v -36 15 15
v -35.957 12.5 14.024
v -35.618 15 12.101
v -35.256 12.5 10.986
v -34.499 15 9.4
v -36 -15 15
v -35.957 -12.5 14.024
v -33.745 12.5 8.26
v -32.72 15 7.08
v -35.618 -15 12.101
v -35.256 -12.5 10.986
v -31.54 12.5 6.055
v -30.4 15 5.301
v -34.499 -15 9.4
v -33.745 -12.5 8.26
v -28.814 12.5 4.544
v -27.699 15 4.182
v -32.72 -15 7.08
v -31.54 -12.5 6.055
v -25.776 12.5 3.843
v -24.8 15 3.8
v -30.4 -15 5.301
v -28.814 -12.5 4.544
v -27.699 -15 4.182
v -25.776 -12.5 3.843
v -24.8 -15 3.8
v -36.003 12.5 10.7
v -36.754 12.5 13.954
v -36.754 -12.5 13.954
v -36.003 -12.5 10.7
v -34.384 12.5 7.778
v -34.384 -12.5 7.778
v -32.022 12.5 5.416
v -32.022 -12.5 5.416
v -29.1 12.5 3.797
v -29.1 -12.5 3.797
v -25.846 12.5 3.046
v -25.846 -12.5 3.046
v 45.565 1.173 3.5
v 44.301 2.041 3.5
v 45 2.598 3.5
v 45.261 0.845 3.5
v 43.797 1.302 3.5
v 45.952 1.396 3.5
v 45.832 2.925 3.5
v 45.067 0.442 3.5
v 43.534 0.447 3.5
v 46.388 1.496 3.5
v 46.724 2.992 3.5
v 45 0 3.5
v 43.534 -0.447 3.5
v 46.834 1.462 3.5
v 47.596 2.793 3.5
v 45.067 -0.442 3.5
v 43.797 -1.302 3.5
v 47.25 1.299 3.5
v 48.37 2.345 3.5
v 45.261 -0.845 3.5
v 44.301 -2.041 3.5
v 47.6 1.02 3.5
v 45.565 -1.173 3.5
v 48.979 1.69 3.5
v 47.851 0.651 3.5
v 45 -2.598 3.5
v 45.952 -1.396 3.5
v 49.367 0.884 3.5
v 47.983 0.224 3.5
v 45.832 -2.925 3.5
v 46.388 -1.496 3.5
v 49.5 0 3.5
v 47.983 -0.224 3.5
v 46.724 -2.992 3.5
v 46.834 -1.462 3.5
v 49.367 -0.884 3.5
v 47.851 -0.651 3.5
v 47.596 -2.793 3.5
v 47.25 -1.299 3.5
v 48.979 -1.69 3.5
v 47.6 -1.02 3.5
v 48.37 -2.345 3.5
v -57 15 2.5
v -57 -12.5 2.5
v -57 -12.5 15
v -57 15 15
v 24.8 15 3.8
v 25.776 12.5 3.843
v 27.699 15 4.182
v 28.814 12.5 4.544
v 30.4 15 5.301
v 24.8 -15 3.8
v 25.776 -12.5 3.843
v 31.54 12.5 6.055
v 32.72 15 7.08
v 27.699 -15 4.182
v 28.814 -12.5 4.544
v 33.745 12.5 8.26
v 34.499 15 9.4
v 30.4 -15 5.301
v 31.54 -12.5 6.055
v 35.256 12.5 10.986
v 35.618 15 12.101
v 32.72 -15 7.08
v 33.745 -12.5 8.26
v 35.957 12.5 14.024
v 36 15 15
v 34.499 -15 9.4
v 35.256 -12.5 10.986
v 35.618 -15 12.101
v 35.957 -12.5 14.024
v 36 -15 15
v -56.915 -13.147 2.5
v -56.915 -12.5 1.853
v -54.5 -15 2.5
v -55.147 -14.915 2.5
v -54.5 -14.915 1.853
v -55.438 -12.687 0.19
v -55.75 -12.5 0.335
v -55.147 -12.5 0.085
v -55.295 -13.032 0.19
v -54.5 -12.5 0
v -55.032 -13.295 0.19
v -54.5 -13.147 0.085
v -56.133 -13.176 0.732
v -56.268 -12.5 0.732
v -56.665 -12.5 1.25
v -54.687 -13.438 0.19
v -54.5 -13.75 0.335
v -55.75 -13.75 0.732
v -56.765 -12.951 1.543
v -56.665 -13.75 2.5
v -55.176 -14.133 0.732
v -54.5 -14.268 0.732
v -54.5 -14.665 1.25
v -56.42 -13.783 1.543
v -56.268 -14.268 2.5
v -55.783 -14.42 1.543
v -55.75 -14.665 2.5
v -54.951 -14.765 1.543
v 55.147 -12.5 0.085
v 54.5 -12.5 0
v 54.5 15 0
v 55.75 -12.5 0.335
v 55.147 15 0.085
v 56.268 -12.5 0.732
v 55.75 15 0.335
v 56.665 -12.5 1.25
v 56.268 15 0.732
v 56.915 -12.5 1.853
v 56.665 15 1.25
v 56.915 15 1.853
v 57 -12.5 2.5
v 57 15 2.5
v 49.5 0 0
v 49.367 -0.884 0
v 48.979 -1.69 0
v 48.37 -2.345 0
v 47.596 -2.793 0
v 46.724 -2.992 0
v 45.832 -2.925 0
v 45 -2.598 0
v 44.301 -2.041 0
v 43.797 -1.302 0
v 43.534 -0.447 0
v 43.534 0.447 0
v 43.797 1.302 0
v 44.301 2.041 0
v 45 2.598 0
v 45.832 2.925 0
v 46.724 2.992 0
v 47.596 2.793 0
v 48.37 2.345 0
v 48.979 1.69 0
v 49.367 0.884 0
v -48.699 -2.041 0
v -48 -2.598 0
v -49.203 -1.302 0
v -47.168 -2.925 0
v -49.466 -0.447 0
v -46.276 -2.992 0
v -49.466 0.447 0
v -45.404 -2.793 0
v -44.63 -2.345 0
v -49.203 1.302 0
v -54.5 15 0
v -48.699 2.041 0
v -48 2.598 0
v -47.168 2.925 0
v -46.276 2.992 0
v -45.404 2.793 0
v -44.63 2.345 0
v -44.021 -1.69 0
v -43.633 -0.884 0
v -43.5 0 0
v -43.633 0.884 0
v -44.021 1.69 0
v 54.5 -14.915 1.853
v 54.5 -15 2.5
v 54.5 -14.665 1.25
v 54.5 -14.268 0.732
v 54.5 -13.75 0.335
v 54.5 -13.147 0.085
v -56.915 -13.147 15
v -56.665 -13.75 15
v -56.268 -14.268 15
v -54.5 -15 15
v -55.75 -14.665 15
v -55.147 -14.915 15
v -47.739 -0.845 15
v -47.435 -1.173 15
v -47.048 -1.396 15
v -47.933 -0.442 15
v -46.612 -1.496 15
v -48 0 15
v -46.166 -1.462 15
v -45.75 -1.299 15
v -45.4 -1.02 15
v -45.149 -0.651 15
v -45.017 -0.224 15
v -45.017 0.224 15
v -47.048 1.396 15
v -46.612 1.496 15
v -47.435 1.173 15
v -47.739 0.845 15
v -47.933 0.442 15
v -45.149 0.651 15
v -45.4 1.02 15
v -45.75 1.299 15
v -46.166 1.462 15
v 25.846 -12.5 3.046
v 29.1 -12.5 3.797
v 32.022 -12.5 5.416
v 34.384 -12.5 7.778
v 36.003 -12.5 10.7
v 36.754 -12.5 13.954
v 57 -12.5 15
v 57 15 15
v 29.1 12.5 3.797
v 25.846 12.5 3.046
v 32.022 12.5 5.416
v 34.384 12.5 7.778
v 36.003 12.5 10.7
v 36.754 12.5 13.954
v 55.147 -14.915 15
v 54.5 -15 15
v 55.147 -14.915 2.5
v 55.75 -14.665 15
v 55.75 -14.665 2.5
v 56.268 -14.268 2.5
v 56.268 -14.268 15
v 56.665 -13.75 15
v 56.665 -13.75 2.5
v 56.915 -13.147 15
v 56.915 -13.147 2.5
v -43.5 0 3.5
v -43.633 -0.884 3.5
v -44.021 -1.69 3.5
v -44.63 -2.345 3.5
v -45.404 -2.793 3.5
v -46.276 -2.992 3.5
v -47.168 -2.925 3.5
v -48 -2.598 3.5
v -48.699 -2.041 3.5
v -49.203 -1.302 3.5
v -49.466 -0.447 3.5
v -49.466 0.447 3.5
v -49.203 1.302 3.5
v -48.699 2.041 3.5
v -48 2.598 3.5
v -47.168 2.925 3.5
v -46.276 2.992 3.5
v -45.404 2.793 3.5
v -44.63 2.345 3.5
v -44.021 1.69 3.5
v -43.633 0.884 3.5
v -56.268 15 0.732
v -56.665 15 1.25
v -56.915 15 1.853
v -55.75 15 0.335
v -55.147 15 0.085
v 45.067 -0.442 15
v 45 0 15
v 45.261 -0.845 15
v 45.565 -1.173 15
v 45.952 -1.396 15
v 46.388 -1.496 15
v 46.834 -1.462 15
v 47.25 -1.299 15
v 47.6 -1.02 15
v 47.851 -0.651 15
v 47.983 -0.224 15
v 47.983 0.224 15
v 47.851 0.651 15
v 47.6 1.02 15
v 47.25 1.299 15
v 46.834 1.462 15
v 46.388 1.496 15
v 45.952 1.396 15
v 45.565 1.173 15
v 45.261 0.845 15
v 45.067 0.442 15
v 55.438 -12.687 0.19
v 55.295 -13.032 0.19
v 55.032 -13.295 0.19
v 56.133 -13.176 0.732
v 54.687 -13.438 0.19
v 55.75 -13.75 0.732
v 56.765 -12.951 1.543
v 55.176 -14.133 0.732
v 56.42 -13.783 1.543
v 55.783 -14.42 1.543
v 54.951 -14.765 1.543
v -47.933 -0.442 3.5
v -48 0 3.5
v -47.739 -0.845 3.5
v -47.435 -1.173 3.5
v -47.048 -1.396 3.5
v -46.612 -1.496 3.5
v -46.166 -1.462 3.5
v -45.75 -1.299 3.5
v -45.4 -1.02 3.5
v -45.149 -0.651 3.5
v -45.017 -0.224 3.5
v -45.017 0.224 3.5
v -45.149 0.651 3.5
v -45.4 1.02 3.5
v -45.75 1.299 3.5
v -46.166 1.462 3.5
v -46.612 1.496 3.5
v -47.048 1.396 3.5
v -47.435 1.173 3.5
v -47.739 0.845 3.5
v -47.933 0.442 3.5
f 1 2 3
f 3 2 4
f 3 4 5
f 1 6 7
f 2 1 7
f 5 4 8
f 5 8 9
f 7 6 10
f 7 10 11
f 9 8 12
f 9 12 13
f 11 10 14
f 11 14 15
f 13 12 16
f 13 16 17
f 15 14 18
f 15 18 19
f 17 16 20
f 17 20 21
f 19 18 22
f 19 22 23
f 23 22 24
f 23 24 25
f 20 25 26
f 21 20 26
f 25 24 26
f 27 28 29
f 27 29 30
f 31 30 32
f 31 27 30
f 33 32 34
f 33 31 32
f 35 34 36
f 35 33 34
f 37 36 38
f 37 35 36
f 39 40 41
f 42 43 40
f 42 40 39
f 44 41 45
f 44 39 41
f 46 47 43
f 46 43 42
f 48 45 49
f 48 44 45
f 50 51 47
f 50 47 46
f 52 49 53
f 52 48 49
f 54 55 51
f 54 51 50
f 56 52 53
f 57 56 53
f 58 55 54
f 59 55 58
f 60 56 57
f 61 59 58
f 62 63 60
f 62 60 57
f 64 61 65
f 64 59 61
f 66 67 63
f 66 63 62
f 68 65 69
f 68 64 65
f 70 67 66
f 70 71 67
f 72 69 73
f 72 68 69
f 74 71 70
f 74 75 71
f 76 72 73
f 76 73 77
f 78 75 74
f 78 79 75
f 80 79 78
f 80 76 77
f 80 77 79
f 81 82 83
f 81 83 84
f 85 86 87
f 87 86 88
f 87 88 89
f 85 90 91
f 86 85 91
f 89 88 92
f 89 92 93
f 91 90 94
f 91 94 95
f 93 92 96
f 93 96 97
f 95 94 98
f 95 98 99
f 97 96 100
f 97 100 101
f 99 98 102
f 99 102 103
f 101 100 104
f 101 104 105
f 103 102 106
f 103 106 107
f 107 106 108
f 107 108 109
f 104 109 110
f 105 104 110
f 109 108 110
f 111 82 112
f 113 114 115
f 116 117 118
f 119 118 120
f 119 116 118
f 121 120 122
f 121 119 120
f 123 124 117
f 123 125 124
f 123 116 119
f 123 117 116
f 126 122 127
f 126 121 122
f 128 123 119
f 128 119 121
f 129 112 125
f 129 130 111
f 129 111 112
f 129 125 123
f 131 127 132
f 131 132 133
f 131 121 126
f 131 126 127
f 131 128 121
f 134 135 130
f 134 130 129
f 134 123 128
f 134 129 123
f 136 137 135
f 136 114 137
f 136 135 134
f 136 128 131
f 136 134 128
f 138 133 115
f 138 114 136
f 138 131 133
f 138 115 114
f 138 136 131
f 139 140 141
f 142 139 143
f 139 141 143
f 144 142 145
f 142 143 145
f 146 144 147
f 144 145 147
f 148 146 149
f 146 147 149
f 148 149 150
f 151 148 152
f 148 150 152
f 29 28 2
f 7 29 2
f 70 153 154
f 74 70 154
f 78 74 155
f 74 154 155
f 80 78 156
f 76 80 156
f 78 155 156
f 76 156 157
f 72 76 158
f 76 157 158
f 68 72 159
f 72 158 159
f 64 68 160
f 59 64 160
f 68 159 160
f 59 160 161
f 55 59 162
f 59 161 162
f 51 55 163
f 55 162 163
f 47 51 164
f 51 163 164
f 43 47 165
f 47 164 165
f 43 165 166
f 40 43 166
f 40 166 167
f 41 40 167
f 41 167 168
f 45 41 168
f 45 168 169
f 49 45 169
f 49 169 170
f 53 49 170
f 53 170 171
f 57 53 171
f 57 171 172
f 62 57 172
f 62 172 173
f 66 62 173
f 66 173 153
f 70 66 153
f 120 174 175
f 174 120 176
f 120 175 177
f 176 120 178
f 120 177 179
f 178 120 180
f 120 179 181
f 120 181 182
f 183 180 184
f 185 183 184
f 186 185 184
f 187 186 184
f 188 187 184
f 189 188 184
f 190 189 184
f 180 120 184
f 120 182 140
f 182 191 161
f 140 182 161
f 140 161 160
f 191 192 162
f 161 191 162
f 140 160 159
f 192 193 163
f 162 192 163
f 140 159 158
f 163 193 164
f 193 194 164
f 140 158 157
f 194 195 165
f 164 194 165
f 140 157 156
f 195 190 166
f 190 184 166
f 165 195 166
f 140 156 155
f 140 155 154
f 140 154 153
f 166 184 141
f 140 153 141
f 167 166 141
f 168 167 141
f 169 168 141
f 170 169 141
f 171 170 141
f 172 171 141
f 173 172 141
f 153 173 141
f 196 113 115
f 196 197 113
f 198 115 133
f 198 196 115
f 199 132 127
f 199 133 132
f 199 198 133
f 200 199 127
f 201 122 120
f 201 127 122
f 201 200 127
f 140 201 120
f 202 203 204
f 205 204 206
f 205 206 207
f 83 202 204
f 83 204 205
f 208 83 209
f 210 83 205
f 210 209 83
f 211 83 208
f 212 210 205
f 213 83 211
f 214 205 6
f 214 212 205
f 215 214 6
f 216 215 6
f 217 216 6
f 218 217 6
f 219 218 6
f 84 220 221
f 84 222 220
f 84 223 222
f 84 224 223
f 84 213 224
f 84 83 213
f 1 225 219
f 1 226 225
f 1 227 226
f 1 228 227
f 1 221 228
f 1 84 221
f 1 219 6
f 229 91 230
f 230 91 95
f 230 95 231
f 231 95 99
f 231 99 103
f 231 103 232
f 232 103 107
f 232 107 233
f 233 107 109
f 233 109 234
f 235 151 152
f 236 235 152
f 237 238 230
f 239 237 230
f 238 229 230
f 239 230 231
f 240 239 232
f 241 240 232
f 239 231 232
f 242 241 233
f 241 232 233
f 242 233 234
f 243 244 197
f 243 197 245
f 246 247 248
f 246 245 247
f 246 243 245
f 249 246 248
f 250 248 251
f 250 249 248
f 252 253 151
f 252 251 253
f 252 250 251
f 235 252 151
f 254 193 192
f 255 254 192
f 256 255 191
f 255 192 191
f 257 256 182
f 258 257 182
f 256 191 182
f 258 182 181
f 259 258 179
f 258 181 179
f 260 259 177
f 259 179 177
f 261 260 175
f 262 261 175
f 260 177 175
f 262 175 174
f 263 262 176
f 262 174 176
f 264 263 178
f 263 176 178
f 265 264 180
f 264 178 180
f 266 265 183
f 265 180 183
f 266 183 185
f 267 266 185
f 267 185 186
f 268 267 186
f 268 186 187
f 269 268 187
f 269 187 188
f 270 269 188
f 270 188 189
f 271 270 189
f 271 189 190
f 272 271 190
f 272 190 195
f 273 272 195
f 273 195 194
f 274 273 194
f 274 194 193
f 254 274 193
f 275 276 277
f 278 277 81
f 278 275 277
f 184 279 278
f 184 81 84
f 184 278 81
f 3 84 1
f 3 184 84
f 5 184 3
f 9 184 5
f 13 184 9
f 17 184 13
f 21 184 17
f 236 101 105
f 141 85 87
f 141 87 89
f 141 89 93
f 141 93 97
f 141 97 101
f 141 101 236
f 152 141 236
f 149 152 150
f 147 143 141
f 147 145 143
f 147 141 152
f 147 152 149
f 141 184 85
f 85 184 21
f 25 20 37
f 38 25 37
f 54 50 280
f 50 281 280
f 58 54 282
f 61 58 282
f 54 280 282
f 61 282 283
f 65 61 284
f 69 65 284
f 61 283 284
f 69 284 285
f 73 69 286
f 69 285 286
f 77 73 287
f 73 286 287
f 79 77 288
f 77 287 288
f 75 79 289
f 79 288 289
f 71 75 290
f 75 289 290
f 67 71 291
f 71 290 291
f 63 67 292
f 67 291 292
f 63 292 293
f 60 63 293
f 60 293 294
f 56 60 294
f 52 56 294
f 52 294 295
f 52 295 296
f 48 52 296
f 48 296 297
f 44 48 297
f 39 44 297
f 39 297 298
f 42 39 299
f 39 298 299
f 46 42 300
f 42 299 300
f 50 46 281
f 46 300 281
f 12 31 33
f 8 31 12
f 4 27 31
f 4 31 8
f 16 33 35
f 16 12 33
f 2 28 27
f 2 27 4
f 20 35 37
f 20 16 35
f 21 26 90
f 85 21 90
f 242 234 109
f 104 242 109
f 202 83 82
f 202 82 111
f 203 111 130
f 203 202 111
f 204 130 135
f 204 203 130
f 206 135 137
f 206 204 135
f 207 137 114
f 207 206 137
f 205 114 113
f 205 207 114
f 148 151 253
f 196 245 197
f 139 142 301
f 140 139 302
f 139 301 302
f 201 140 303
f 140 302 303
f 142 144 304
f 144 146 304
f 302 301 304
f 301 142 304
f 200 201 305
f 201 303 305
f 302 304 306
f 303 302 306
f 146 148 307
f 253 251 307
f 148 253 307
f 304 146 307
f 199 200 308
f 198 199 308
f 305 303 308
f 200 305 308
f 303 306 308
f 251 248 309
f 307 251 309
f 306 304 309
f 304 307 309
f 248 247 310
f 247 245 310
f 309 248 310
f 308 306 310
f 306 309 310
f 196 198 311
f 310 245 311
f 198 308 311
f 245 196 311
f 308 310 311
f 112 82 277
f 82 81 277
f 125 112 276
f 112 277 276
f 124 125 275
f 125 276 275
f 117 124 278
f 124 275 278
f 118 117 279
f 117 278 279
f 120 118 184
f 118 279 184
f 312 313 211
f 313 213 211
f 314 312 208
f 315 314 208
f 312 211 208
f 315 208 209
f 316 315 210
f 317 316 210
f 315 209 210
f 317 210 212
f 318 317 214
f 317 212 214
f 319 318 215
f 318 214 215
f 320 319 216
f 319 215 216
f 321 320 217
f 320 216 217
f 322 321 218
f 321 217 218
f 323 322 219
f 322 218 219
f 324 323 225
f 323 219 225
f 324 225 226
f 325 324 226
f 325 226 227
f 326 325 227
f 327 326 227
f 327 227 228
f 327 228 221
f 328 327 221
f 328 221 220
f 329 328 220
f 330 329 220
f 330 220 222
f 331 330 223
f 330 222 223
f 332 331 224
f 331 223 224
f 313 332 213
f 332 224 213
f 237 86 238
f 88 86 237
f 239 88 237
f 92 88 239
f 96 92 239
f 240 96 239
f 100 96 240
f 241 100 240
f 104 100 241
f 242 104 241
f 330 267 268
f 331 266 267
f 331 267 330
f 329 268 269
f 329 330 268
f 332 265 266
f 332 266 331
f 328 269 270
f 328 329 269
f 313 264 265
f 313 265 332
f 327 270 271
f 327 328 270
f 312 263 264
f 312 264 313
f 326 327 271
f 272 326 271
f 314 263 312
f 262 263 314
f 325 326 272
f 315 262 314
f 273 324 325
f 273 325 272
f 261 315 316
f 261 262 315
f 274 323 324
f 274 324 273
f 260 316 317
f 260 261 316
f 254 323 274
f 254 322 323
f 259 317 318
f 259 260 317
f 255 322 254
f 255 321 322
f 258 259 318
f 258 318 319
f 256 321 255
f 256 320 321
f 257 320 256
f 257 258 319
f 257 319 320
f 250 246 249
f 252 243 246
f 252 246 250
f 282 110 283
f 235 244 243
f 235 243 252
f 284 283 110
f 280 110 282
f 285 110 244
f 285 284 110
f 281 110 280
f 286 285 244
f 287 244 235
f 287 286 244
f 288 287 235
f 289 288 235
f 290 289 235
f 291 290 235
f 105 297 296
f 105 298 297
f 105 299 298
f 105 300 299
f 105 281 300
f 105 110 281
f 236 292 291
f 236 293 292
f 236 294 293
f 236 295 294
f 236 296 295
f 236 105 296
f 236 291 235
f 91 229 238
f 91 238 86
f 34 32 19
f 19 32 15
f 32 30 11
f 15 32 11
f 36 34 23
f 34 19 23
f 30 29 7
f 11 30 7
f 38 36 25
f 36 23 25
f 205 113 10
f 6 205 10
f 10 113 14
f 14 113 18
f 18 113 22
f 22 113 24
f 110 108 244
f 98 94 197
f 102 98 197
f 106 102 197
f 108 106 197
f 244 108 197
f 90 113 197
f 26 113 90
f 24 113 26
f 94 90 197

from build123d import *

# Parameters (mm, degrees)
SKETCH_W         = 114
SKETCH_H         = 30
PAD_DEPTH        = 15
POCKET_DEPTH     = 30.001
POCKET001_DEPTH  = 12.5
HOLE_D           = 3
HOLE_CBORE_D     = 6
HOLE_CBORE_DEPTH = 3.5
FILLET_R         = 2.5


with BuildPart() as part:
    # Sketch → Pad (new body)
    with BuildSketch(Plane.XY):
        Rectangle(SKETCH_W, SKETCH_H)
    extrude(amount=PAD_DEPTH)

    # Sketch001 (on Face2 of Pad) → Pocket (cut, through all)
    with BuildSketch(Plane.XZ.offset(15)):
        with BuildLine():
            ThreePointArc((-36, 15), (-32.719596, 7.080404), (-24.8, 3.8))
            Line((-24.8, 3.8), (24.8, 3.8))
            ThreePointArc((24.8, 3.8), (32.719596, 7.080404), (36, 15))
            Line((-36, 15), (36, 15))
        make_face()
    extrude(amount=-POCKET_DEPTH, mode=Mode.SUBTRACT)

    # Sketch002 (on DatumPlane) → Pocket001 (cut, symmetric)
    with BuildSketch(Plane.XZ):
        with BuildLine():
            ThreePointArc((-36.754336, 13.954131), (-33.285281, 6.514719), (-25.845869, 3.045664))
            Line((-24.8, 15), (-25.845869, 3.045664))
            Line((-36.754336, 13.954131), (-24.8, 15))
        make_face()
        with BuildLine():
            ThreePointArc((25.845869, 3.045664), (33.285281, 6.514719), (36.754336, 13.954131))
            Line((36.754336, 13.954131), (24.8, 15))
            Line((25.845869, 3.045664), (24.8, 15))
        make_face()
    extrude(amount=POCKET001_DEPTH, both=True, mode=Mode.SUBTRACT)

    # Hole (through all)
    with Locations(Plane(origin=(0, 0, 0), x_dir=(1, 0, 0), z_dir=(0, 0, -1))):
        with Locations((-46.5, 0), (46.5, 0)):
            CounterBoreHole(HOLE_D / 2, HOLE_CBORE_D / 2, HOLE_CBORE_DEPTH)

    # Fillet
    fillet_edges = [part.edges().sort_by_distance(p)[0] for p in [
        (-57, -15, 7.5),
        (57, -15, 7.5),
        (57, 0, 0),
        (-57, 0, 0),
        (0, -15, 0),
    ]]
    fillet(fillet_edges, radius=FILLET_R)


solid = part.part
